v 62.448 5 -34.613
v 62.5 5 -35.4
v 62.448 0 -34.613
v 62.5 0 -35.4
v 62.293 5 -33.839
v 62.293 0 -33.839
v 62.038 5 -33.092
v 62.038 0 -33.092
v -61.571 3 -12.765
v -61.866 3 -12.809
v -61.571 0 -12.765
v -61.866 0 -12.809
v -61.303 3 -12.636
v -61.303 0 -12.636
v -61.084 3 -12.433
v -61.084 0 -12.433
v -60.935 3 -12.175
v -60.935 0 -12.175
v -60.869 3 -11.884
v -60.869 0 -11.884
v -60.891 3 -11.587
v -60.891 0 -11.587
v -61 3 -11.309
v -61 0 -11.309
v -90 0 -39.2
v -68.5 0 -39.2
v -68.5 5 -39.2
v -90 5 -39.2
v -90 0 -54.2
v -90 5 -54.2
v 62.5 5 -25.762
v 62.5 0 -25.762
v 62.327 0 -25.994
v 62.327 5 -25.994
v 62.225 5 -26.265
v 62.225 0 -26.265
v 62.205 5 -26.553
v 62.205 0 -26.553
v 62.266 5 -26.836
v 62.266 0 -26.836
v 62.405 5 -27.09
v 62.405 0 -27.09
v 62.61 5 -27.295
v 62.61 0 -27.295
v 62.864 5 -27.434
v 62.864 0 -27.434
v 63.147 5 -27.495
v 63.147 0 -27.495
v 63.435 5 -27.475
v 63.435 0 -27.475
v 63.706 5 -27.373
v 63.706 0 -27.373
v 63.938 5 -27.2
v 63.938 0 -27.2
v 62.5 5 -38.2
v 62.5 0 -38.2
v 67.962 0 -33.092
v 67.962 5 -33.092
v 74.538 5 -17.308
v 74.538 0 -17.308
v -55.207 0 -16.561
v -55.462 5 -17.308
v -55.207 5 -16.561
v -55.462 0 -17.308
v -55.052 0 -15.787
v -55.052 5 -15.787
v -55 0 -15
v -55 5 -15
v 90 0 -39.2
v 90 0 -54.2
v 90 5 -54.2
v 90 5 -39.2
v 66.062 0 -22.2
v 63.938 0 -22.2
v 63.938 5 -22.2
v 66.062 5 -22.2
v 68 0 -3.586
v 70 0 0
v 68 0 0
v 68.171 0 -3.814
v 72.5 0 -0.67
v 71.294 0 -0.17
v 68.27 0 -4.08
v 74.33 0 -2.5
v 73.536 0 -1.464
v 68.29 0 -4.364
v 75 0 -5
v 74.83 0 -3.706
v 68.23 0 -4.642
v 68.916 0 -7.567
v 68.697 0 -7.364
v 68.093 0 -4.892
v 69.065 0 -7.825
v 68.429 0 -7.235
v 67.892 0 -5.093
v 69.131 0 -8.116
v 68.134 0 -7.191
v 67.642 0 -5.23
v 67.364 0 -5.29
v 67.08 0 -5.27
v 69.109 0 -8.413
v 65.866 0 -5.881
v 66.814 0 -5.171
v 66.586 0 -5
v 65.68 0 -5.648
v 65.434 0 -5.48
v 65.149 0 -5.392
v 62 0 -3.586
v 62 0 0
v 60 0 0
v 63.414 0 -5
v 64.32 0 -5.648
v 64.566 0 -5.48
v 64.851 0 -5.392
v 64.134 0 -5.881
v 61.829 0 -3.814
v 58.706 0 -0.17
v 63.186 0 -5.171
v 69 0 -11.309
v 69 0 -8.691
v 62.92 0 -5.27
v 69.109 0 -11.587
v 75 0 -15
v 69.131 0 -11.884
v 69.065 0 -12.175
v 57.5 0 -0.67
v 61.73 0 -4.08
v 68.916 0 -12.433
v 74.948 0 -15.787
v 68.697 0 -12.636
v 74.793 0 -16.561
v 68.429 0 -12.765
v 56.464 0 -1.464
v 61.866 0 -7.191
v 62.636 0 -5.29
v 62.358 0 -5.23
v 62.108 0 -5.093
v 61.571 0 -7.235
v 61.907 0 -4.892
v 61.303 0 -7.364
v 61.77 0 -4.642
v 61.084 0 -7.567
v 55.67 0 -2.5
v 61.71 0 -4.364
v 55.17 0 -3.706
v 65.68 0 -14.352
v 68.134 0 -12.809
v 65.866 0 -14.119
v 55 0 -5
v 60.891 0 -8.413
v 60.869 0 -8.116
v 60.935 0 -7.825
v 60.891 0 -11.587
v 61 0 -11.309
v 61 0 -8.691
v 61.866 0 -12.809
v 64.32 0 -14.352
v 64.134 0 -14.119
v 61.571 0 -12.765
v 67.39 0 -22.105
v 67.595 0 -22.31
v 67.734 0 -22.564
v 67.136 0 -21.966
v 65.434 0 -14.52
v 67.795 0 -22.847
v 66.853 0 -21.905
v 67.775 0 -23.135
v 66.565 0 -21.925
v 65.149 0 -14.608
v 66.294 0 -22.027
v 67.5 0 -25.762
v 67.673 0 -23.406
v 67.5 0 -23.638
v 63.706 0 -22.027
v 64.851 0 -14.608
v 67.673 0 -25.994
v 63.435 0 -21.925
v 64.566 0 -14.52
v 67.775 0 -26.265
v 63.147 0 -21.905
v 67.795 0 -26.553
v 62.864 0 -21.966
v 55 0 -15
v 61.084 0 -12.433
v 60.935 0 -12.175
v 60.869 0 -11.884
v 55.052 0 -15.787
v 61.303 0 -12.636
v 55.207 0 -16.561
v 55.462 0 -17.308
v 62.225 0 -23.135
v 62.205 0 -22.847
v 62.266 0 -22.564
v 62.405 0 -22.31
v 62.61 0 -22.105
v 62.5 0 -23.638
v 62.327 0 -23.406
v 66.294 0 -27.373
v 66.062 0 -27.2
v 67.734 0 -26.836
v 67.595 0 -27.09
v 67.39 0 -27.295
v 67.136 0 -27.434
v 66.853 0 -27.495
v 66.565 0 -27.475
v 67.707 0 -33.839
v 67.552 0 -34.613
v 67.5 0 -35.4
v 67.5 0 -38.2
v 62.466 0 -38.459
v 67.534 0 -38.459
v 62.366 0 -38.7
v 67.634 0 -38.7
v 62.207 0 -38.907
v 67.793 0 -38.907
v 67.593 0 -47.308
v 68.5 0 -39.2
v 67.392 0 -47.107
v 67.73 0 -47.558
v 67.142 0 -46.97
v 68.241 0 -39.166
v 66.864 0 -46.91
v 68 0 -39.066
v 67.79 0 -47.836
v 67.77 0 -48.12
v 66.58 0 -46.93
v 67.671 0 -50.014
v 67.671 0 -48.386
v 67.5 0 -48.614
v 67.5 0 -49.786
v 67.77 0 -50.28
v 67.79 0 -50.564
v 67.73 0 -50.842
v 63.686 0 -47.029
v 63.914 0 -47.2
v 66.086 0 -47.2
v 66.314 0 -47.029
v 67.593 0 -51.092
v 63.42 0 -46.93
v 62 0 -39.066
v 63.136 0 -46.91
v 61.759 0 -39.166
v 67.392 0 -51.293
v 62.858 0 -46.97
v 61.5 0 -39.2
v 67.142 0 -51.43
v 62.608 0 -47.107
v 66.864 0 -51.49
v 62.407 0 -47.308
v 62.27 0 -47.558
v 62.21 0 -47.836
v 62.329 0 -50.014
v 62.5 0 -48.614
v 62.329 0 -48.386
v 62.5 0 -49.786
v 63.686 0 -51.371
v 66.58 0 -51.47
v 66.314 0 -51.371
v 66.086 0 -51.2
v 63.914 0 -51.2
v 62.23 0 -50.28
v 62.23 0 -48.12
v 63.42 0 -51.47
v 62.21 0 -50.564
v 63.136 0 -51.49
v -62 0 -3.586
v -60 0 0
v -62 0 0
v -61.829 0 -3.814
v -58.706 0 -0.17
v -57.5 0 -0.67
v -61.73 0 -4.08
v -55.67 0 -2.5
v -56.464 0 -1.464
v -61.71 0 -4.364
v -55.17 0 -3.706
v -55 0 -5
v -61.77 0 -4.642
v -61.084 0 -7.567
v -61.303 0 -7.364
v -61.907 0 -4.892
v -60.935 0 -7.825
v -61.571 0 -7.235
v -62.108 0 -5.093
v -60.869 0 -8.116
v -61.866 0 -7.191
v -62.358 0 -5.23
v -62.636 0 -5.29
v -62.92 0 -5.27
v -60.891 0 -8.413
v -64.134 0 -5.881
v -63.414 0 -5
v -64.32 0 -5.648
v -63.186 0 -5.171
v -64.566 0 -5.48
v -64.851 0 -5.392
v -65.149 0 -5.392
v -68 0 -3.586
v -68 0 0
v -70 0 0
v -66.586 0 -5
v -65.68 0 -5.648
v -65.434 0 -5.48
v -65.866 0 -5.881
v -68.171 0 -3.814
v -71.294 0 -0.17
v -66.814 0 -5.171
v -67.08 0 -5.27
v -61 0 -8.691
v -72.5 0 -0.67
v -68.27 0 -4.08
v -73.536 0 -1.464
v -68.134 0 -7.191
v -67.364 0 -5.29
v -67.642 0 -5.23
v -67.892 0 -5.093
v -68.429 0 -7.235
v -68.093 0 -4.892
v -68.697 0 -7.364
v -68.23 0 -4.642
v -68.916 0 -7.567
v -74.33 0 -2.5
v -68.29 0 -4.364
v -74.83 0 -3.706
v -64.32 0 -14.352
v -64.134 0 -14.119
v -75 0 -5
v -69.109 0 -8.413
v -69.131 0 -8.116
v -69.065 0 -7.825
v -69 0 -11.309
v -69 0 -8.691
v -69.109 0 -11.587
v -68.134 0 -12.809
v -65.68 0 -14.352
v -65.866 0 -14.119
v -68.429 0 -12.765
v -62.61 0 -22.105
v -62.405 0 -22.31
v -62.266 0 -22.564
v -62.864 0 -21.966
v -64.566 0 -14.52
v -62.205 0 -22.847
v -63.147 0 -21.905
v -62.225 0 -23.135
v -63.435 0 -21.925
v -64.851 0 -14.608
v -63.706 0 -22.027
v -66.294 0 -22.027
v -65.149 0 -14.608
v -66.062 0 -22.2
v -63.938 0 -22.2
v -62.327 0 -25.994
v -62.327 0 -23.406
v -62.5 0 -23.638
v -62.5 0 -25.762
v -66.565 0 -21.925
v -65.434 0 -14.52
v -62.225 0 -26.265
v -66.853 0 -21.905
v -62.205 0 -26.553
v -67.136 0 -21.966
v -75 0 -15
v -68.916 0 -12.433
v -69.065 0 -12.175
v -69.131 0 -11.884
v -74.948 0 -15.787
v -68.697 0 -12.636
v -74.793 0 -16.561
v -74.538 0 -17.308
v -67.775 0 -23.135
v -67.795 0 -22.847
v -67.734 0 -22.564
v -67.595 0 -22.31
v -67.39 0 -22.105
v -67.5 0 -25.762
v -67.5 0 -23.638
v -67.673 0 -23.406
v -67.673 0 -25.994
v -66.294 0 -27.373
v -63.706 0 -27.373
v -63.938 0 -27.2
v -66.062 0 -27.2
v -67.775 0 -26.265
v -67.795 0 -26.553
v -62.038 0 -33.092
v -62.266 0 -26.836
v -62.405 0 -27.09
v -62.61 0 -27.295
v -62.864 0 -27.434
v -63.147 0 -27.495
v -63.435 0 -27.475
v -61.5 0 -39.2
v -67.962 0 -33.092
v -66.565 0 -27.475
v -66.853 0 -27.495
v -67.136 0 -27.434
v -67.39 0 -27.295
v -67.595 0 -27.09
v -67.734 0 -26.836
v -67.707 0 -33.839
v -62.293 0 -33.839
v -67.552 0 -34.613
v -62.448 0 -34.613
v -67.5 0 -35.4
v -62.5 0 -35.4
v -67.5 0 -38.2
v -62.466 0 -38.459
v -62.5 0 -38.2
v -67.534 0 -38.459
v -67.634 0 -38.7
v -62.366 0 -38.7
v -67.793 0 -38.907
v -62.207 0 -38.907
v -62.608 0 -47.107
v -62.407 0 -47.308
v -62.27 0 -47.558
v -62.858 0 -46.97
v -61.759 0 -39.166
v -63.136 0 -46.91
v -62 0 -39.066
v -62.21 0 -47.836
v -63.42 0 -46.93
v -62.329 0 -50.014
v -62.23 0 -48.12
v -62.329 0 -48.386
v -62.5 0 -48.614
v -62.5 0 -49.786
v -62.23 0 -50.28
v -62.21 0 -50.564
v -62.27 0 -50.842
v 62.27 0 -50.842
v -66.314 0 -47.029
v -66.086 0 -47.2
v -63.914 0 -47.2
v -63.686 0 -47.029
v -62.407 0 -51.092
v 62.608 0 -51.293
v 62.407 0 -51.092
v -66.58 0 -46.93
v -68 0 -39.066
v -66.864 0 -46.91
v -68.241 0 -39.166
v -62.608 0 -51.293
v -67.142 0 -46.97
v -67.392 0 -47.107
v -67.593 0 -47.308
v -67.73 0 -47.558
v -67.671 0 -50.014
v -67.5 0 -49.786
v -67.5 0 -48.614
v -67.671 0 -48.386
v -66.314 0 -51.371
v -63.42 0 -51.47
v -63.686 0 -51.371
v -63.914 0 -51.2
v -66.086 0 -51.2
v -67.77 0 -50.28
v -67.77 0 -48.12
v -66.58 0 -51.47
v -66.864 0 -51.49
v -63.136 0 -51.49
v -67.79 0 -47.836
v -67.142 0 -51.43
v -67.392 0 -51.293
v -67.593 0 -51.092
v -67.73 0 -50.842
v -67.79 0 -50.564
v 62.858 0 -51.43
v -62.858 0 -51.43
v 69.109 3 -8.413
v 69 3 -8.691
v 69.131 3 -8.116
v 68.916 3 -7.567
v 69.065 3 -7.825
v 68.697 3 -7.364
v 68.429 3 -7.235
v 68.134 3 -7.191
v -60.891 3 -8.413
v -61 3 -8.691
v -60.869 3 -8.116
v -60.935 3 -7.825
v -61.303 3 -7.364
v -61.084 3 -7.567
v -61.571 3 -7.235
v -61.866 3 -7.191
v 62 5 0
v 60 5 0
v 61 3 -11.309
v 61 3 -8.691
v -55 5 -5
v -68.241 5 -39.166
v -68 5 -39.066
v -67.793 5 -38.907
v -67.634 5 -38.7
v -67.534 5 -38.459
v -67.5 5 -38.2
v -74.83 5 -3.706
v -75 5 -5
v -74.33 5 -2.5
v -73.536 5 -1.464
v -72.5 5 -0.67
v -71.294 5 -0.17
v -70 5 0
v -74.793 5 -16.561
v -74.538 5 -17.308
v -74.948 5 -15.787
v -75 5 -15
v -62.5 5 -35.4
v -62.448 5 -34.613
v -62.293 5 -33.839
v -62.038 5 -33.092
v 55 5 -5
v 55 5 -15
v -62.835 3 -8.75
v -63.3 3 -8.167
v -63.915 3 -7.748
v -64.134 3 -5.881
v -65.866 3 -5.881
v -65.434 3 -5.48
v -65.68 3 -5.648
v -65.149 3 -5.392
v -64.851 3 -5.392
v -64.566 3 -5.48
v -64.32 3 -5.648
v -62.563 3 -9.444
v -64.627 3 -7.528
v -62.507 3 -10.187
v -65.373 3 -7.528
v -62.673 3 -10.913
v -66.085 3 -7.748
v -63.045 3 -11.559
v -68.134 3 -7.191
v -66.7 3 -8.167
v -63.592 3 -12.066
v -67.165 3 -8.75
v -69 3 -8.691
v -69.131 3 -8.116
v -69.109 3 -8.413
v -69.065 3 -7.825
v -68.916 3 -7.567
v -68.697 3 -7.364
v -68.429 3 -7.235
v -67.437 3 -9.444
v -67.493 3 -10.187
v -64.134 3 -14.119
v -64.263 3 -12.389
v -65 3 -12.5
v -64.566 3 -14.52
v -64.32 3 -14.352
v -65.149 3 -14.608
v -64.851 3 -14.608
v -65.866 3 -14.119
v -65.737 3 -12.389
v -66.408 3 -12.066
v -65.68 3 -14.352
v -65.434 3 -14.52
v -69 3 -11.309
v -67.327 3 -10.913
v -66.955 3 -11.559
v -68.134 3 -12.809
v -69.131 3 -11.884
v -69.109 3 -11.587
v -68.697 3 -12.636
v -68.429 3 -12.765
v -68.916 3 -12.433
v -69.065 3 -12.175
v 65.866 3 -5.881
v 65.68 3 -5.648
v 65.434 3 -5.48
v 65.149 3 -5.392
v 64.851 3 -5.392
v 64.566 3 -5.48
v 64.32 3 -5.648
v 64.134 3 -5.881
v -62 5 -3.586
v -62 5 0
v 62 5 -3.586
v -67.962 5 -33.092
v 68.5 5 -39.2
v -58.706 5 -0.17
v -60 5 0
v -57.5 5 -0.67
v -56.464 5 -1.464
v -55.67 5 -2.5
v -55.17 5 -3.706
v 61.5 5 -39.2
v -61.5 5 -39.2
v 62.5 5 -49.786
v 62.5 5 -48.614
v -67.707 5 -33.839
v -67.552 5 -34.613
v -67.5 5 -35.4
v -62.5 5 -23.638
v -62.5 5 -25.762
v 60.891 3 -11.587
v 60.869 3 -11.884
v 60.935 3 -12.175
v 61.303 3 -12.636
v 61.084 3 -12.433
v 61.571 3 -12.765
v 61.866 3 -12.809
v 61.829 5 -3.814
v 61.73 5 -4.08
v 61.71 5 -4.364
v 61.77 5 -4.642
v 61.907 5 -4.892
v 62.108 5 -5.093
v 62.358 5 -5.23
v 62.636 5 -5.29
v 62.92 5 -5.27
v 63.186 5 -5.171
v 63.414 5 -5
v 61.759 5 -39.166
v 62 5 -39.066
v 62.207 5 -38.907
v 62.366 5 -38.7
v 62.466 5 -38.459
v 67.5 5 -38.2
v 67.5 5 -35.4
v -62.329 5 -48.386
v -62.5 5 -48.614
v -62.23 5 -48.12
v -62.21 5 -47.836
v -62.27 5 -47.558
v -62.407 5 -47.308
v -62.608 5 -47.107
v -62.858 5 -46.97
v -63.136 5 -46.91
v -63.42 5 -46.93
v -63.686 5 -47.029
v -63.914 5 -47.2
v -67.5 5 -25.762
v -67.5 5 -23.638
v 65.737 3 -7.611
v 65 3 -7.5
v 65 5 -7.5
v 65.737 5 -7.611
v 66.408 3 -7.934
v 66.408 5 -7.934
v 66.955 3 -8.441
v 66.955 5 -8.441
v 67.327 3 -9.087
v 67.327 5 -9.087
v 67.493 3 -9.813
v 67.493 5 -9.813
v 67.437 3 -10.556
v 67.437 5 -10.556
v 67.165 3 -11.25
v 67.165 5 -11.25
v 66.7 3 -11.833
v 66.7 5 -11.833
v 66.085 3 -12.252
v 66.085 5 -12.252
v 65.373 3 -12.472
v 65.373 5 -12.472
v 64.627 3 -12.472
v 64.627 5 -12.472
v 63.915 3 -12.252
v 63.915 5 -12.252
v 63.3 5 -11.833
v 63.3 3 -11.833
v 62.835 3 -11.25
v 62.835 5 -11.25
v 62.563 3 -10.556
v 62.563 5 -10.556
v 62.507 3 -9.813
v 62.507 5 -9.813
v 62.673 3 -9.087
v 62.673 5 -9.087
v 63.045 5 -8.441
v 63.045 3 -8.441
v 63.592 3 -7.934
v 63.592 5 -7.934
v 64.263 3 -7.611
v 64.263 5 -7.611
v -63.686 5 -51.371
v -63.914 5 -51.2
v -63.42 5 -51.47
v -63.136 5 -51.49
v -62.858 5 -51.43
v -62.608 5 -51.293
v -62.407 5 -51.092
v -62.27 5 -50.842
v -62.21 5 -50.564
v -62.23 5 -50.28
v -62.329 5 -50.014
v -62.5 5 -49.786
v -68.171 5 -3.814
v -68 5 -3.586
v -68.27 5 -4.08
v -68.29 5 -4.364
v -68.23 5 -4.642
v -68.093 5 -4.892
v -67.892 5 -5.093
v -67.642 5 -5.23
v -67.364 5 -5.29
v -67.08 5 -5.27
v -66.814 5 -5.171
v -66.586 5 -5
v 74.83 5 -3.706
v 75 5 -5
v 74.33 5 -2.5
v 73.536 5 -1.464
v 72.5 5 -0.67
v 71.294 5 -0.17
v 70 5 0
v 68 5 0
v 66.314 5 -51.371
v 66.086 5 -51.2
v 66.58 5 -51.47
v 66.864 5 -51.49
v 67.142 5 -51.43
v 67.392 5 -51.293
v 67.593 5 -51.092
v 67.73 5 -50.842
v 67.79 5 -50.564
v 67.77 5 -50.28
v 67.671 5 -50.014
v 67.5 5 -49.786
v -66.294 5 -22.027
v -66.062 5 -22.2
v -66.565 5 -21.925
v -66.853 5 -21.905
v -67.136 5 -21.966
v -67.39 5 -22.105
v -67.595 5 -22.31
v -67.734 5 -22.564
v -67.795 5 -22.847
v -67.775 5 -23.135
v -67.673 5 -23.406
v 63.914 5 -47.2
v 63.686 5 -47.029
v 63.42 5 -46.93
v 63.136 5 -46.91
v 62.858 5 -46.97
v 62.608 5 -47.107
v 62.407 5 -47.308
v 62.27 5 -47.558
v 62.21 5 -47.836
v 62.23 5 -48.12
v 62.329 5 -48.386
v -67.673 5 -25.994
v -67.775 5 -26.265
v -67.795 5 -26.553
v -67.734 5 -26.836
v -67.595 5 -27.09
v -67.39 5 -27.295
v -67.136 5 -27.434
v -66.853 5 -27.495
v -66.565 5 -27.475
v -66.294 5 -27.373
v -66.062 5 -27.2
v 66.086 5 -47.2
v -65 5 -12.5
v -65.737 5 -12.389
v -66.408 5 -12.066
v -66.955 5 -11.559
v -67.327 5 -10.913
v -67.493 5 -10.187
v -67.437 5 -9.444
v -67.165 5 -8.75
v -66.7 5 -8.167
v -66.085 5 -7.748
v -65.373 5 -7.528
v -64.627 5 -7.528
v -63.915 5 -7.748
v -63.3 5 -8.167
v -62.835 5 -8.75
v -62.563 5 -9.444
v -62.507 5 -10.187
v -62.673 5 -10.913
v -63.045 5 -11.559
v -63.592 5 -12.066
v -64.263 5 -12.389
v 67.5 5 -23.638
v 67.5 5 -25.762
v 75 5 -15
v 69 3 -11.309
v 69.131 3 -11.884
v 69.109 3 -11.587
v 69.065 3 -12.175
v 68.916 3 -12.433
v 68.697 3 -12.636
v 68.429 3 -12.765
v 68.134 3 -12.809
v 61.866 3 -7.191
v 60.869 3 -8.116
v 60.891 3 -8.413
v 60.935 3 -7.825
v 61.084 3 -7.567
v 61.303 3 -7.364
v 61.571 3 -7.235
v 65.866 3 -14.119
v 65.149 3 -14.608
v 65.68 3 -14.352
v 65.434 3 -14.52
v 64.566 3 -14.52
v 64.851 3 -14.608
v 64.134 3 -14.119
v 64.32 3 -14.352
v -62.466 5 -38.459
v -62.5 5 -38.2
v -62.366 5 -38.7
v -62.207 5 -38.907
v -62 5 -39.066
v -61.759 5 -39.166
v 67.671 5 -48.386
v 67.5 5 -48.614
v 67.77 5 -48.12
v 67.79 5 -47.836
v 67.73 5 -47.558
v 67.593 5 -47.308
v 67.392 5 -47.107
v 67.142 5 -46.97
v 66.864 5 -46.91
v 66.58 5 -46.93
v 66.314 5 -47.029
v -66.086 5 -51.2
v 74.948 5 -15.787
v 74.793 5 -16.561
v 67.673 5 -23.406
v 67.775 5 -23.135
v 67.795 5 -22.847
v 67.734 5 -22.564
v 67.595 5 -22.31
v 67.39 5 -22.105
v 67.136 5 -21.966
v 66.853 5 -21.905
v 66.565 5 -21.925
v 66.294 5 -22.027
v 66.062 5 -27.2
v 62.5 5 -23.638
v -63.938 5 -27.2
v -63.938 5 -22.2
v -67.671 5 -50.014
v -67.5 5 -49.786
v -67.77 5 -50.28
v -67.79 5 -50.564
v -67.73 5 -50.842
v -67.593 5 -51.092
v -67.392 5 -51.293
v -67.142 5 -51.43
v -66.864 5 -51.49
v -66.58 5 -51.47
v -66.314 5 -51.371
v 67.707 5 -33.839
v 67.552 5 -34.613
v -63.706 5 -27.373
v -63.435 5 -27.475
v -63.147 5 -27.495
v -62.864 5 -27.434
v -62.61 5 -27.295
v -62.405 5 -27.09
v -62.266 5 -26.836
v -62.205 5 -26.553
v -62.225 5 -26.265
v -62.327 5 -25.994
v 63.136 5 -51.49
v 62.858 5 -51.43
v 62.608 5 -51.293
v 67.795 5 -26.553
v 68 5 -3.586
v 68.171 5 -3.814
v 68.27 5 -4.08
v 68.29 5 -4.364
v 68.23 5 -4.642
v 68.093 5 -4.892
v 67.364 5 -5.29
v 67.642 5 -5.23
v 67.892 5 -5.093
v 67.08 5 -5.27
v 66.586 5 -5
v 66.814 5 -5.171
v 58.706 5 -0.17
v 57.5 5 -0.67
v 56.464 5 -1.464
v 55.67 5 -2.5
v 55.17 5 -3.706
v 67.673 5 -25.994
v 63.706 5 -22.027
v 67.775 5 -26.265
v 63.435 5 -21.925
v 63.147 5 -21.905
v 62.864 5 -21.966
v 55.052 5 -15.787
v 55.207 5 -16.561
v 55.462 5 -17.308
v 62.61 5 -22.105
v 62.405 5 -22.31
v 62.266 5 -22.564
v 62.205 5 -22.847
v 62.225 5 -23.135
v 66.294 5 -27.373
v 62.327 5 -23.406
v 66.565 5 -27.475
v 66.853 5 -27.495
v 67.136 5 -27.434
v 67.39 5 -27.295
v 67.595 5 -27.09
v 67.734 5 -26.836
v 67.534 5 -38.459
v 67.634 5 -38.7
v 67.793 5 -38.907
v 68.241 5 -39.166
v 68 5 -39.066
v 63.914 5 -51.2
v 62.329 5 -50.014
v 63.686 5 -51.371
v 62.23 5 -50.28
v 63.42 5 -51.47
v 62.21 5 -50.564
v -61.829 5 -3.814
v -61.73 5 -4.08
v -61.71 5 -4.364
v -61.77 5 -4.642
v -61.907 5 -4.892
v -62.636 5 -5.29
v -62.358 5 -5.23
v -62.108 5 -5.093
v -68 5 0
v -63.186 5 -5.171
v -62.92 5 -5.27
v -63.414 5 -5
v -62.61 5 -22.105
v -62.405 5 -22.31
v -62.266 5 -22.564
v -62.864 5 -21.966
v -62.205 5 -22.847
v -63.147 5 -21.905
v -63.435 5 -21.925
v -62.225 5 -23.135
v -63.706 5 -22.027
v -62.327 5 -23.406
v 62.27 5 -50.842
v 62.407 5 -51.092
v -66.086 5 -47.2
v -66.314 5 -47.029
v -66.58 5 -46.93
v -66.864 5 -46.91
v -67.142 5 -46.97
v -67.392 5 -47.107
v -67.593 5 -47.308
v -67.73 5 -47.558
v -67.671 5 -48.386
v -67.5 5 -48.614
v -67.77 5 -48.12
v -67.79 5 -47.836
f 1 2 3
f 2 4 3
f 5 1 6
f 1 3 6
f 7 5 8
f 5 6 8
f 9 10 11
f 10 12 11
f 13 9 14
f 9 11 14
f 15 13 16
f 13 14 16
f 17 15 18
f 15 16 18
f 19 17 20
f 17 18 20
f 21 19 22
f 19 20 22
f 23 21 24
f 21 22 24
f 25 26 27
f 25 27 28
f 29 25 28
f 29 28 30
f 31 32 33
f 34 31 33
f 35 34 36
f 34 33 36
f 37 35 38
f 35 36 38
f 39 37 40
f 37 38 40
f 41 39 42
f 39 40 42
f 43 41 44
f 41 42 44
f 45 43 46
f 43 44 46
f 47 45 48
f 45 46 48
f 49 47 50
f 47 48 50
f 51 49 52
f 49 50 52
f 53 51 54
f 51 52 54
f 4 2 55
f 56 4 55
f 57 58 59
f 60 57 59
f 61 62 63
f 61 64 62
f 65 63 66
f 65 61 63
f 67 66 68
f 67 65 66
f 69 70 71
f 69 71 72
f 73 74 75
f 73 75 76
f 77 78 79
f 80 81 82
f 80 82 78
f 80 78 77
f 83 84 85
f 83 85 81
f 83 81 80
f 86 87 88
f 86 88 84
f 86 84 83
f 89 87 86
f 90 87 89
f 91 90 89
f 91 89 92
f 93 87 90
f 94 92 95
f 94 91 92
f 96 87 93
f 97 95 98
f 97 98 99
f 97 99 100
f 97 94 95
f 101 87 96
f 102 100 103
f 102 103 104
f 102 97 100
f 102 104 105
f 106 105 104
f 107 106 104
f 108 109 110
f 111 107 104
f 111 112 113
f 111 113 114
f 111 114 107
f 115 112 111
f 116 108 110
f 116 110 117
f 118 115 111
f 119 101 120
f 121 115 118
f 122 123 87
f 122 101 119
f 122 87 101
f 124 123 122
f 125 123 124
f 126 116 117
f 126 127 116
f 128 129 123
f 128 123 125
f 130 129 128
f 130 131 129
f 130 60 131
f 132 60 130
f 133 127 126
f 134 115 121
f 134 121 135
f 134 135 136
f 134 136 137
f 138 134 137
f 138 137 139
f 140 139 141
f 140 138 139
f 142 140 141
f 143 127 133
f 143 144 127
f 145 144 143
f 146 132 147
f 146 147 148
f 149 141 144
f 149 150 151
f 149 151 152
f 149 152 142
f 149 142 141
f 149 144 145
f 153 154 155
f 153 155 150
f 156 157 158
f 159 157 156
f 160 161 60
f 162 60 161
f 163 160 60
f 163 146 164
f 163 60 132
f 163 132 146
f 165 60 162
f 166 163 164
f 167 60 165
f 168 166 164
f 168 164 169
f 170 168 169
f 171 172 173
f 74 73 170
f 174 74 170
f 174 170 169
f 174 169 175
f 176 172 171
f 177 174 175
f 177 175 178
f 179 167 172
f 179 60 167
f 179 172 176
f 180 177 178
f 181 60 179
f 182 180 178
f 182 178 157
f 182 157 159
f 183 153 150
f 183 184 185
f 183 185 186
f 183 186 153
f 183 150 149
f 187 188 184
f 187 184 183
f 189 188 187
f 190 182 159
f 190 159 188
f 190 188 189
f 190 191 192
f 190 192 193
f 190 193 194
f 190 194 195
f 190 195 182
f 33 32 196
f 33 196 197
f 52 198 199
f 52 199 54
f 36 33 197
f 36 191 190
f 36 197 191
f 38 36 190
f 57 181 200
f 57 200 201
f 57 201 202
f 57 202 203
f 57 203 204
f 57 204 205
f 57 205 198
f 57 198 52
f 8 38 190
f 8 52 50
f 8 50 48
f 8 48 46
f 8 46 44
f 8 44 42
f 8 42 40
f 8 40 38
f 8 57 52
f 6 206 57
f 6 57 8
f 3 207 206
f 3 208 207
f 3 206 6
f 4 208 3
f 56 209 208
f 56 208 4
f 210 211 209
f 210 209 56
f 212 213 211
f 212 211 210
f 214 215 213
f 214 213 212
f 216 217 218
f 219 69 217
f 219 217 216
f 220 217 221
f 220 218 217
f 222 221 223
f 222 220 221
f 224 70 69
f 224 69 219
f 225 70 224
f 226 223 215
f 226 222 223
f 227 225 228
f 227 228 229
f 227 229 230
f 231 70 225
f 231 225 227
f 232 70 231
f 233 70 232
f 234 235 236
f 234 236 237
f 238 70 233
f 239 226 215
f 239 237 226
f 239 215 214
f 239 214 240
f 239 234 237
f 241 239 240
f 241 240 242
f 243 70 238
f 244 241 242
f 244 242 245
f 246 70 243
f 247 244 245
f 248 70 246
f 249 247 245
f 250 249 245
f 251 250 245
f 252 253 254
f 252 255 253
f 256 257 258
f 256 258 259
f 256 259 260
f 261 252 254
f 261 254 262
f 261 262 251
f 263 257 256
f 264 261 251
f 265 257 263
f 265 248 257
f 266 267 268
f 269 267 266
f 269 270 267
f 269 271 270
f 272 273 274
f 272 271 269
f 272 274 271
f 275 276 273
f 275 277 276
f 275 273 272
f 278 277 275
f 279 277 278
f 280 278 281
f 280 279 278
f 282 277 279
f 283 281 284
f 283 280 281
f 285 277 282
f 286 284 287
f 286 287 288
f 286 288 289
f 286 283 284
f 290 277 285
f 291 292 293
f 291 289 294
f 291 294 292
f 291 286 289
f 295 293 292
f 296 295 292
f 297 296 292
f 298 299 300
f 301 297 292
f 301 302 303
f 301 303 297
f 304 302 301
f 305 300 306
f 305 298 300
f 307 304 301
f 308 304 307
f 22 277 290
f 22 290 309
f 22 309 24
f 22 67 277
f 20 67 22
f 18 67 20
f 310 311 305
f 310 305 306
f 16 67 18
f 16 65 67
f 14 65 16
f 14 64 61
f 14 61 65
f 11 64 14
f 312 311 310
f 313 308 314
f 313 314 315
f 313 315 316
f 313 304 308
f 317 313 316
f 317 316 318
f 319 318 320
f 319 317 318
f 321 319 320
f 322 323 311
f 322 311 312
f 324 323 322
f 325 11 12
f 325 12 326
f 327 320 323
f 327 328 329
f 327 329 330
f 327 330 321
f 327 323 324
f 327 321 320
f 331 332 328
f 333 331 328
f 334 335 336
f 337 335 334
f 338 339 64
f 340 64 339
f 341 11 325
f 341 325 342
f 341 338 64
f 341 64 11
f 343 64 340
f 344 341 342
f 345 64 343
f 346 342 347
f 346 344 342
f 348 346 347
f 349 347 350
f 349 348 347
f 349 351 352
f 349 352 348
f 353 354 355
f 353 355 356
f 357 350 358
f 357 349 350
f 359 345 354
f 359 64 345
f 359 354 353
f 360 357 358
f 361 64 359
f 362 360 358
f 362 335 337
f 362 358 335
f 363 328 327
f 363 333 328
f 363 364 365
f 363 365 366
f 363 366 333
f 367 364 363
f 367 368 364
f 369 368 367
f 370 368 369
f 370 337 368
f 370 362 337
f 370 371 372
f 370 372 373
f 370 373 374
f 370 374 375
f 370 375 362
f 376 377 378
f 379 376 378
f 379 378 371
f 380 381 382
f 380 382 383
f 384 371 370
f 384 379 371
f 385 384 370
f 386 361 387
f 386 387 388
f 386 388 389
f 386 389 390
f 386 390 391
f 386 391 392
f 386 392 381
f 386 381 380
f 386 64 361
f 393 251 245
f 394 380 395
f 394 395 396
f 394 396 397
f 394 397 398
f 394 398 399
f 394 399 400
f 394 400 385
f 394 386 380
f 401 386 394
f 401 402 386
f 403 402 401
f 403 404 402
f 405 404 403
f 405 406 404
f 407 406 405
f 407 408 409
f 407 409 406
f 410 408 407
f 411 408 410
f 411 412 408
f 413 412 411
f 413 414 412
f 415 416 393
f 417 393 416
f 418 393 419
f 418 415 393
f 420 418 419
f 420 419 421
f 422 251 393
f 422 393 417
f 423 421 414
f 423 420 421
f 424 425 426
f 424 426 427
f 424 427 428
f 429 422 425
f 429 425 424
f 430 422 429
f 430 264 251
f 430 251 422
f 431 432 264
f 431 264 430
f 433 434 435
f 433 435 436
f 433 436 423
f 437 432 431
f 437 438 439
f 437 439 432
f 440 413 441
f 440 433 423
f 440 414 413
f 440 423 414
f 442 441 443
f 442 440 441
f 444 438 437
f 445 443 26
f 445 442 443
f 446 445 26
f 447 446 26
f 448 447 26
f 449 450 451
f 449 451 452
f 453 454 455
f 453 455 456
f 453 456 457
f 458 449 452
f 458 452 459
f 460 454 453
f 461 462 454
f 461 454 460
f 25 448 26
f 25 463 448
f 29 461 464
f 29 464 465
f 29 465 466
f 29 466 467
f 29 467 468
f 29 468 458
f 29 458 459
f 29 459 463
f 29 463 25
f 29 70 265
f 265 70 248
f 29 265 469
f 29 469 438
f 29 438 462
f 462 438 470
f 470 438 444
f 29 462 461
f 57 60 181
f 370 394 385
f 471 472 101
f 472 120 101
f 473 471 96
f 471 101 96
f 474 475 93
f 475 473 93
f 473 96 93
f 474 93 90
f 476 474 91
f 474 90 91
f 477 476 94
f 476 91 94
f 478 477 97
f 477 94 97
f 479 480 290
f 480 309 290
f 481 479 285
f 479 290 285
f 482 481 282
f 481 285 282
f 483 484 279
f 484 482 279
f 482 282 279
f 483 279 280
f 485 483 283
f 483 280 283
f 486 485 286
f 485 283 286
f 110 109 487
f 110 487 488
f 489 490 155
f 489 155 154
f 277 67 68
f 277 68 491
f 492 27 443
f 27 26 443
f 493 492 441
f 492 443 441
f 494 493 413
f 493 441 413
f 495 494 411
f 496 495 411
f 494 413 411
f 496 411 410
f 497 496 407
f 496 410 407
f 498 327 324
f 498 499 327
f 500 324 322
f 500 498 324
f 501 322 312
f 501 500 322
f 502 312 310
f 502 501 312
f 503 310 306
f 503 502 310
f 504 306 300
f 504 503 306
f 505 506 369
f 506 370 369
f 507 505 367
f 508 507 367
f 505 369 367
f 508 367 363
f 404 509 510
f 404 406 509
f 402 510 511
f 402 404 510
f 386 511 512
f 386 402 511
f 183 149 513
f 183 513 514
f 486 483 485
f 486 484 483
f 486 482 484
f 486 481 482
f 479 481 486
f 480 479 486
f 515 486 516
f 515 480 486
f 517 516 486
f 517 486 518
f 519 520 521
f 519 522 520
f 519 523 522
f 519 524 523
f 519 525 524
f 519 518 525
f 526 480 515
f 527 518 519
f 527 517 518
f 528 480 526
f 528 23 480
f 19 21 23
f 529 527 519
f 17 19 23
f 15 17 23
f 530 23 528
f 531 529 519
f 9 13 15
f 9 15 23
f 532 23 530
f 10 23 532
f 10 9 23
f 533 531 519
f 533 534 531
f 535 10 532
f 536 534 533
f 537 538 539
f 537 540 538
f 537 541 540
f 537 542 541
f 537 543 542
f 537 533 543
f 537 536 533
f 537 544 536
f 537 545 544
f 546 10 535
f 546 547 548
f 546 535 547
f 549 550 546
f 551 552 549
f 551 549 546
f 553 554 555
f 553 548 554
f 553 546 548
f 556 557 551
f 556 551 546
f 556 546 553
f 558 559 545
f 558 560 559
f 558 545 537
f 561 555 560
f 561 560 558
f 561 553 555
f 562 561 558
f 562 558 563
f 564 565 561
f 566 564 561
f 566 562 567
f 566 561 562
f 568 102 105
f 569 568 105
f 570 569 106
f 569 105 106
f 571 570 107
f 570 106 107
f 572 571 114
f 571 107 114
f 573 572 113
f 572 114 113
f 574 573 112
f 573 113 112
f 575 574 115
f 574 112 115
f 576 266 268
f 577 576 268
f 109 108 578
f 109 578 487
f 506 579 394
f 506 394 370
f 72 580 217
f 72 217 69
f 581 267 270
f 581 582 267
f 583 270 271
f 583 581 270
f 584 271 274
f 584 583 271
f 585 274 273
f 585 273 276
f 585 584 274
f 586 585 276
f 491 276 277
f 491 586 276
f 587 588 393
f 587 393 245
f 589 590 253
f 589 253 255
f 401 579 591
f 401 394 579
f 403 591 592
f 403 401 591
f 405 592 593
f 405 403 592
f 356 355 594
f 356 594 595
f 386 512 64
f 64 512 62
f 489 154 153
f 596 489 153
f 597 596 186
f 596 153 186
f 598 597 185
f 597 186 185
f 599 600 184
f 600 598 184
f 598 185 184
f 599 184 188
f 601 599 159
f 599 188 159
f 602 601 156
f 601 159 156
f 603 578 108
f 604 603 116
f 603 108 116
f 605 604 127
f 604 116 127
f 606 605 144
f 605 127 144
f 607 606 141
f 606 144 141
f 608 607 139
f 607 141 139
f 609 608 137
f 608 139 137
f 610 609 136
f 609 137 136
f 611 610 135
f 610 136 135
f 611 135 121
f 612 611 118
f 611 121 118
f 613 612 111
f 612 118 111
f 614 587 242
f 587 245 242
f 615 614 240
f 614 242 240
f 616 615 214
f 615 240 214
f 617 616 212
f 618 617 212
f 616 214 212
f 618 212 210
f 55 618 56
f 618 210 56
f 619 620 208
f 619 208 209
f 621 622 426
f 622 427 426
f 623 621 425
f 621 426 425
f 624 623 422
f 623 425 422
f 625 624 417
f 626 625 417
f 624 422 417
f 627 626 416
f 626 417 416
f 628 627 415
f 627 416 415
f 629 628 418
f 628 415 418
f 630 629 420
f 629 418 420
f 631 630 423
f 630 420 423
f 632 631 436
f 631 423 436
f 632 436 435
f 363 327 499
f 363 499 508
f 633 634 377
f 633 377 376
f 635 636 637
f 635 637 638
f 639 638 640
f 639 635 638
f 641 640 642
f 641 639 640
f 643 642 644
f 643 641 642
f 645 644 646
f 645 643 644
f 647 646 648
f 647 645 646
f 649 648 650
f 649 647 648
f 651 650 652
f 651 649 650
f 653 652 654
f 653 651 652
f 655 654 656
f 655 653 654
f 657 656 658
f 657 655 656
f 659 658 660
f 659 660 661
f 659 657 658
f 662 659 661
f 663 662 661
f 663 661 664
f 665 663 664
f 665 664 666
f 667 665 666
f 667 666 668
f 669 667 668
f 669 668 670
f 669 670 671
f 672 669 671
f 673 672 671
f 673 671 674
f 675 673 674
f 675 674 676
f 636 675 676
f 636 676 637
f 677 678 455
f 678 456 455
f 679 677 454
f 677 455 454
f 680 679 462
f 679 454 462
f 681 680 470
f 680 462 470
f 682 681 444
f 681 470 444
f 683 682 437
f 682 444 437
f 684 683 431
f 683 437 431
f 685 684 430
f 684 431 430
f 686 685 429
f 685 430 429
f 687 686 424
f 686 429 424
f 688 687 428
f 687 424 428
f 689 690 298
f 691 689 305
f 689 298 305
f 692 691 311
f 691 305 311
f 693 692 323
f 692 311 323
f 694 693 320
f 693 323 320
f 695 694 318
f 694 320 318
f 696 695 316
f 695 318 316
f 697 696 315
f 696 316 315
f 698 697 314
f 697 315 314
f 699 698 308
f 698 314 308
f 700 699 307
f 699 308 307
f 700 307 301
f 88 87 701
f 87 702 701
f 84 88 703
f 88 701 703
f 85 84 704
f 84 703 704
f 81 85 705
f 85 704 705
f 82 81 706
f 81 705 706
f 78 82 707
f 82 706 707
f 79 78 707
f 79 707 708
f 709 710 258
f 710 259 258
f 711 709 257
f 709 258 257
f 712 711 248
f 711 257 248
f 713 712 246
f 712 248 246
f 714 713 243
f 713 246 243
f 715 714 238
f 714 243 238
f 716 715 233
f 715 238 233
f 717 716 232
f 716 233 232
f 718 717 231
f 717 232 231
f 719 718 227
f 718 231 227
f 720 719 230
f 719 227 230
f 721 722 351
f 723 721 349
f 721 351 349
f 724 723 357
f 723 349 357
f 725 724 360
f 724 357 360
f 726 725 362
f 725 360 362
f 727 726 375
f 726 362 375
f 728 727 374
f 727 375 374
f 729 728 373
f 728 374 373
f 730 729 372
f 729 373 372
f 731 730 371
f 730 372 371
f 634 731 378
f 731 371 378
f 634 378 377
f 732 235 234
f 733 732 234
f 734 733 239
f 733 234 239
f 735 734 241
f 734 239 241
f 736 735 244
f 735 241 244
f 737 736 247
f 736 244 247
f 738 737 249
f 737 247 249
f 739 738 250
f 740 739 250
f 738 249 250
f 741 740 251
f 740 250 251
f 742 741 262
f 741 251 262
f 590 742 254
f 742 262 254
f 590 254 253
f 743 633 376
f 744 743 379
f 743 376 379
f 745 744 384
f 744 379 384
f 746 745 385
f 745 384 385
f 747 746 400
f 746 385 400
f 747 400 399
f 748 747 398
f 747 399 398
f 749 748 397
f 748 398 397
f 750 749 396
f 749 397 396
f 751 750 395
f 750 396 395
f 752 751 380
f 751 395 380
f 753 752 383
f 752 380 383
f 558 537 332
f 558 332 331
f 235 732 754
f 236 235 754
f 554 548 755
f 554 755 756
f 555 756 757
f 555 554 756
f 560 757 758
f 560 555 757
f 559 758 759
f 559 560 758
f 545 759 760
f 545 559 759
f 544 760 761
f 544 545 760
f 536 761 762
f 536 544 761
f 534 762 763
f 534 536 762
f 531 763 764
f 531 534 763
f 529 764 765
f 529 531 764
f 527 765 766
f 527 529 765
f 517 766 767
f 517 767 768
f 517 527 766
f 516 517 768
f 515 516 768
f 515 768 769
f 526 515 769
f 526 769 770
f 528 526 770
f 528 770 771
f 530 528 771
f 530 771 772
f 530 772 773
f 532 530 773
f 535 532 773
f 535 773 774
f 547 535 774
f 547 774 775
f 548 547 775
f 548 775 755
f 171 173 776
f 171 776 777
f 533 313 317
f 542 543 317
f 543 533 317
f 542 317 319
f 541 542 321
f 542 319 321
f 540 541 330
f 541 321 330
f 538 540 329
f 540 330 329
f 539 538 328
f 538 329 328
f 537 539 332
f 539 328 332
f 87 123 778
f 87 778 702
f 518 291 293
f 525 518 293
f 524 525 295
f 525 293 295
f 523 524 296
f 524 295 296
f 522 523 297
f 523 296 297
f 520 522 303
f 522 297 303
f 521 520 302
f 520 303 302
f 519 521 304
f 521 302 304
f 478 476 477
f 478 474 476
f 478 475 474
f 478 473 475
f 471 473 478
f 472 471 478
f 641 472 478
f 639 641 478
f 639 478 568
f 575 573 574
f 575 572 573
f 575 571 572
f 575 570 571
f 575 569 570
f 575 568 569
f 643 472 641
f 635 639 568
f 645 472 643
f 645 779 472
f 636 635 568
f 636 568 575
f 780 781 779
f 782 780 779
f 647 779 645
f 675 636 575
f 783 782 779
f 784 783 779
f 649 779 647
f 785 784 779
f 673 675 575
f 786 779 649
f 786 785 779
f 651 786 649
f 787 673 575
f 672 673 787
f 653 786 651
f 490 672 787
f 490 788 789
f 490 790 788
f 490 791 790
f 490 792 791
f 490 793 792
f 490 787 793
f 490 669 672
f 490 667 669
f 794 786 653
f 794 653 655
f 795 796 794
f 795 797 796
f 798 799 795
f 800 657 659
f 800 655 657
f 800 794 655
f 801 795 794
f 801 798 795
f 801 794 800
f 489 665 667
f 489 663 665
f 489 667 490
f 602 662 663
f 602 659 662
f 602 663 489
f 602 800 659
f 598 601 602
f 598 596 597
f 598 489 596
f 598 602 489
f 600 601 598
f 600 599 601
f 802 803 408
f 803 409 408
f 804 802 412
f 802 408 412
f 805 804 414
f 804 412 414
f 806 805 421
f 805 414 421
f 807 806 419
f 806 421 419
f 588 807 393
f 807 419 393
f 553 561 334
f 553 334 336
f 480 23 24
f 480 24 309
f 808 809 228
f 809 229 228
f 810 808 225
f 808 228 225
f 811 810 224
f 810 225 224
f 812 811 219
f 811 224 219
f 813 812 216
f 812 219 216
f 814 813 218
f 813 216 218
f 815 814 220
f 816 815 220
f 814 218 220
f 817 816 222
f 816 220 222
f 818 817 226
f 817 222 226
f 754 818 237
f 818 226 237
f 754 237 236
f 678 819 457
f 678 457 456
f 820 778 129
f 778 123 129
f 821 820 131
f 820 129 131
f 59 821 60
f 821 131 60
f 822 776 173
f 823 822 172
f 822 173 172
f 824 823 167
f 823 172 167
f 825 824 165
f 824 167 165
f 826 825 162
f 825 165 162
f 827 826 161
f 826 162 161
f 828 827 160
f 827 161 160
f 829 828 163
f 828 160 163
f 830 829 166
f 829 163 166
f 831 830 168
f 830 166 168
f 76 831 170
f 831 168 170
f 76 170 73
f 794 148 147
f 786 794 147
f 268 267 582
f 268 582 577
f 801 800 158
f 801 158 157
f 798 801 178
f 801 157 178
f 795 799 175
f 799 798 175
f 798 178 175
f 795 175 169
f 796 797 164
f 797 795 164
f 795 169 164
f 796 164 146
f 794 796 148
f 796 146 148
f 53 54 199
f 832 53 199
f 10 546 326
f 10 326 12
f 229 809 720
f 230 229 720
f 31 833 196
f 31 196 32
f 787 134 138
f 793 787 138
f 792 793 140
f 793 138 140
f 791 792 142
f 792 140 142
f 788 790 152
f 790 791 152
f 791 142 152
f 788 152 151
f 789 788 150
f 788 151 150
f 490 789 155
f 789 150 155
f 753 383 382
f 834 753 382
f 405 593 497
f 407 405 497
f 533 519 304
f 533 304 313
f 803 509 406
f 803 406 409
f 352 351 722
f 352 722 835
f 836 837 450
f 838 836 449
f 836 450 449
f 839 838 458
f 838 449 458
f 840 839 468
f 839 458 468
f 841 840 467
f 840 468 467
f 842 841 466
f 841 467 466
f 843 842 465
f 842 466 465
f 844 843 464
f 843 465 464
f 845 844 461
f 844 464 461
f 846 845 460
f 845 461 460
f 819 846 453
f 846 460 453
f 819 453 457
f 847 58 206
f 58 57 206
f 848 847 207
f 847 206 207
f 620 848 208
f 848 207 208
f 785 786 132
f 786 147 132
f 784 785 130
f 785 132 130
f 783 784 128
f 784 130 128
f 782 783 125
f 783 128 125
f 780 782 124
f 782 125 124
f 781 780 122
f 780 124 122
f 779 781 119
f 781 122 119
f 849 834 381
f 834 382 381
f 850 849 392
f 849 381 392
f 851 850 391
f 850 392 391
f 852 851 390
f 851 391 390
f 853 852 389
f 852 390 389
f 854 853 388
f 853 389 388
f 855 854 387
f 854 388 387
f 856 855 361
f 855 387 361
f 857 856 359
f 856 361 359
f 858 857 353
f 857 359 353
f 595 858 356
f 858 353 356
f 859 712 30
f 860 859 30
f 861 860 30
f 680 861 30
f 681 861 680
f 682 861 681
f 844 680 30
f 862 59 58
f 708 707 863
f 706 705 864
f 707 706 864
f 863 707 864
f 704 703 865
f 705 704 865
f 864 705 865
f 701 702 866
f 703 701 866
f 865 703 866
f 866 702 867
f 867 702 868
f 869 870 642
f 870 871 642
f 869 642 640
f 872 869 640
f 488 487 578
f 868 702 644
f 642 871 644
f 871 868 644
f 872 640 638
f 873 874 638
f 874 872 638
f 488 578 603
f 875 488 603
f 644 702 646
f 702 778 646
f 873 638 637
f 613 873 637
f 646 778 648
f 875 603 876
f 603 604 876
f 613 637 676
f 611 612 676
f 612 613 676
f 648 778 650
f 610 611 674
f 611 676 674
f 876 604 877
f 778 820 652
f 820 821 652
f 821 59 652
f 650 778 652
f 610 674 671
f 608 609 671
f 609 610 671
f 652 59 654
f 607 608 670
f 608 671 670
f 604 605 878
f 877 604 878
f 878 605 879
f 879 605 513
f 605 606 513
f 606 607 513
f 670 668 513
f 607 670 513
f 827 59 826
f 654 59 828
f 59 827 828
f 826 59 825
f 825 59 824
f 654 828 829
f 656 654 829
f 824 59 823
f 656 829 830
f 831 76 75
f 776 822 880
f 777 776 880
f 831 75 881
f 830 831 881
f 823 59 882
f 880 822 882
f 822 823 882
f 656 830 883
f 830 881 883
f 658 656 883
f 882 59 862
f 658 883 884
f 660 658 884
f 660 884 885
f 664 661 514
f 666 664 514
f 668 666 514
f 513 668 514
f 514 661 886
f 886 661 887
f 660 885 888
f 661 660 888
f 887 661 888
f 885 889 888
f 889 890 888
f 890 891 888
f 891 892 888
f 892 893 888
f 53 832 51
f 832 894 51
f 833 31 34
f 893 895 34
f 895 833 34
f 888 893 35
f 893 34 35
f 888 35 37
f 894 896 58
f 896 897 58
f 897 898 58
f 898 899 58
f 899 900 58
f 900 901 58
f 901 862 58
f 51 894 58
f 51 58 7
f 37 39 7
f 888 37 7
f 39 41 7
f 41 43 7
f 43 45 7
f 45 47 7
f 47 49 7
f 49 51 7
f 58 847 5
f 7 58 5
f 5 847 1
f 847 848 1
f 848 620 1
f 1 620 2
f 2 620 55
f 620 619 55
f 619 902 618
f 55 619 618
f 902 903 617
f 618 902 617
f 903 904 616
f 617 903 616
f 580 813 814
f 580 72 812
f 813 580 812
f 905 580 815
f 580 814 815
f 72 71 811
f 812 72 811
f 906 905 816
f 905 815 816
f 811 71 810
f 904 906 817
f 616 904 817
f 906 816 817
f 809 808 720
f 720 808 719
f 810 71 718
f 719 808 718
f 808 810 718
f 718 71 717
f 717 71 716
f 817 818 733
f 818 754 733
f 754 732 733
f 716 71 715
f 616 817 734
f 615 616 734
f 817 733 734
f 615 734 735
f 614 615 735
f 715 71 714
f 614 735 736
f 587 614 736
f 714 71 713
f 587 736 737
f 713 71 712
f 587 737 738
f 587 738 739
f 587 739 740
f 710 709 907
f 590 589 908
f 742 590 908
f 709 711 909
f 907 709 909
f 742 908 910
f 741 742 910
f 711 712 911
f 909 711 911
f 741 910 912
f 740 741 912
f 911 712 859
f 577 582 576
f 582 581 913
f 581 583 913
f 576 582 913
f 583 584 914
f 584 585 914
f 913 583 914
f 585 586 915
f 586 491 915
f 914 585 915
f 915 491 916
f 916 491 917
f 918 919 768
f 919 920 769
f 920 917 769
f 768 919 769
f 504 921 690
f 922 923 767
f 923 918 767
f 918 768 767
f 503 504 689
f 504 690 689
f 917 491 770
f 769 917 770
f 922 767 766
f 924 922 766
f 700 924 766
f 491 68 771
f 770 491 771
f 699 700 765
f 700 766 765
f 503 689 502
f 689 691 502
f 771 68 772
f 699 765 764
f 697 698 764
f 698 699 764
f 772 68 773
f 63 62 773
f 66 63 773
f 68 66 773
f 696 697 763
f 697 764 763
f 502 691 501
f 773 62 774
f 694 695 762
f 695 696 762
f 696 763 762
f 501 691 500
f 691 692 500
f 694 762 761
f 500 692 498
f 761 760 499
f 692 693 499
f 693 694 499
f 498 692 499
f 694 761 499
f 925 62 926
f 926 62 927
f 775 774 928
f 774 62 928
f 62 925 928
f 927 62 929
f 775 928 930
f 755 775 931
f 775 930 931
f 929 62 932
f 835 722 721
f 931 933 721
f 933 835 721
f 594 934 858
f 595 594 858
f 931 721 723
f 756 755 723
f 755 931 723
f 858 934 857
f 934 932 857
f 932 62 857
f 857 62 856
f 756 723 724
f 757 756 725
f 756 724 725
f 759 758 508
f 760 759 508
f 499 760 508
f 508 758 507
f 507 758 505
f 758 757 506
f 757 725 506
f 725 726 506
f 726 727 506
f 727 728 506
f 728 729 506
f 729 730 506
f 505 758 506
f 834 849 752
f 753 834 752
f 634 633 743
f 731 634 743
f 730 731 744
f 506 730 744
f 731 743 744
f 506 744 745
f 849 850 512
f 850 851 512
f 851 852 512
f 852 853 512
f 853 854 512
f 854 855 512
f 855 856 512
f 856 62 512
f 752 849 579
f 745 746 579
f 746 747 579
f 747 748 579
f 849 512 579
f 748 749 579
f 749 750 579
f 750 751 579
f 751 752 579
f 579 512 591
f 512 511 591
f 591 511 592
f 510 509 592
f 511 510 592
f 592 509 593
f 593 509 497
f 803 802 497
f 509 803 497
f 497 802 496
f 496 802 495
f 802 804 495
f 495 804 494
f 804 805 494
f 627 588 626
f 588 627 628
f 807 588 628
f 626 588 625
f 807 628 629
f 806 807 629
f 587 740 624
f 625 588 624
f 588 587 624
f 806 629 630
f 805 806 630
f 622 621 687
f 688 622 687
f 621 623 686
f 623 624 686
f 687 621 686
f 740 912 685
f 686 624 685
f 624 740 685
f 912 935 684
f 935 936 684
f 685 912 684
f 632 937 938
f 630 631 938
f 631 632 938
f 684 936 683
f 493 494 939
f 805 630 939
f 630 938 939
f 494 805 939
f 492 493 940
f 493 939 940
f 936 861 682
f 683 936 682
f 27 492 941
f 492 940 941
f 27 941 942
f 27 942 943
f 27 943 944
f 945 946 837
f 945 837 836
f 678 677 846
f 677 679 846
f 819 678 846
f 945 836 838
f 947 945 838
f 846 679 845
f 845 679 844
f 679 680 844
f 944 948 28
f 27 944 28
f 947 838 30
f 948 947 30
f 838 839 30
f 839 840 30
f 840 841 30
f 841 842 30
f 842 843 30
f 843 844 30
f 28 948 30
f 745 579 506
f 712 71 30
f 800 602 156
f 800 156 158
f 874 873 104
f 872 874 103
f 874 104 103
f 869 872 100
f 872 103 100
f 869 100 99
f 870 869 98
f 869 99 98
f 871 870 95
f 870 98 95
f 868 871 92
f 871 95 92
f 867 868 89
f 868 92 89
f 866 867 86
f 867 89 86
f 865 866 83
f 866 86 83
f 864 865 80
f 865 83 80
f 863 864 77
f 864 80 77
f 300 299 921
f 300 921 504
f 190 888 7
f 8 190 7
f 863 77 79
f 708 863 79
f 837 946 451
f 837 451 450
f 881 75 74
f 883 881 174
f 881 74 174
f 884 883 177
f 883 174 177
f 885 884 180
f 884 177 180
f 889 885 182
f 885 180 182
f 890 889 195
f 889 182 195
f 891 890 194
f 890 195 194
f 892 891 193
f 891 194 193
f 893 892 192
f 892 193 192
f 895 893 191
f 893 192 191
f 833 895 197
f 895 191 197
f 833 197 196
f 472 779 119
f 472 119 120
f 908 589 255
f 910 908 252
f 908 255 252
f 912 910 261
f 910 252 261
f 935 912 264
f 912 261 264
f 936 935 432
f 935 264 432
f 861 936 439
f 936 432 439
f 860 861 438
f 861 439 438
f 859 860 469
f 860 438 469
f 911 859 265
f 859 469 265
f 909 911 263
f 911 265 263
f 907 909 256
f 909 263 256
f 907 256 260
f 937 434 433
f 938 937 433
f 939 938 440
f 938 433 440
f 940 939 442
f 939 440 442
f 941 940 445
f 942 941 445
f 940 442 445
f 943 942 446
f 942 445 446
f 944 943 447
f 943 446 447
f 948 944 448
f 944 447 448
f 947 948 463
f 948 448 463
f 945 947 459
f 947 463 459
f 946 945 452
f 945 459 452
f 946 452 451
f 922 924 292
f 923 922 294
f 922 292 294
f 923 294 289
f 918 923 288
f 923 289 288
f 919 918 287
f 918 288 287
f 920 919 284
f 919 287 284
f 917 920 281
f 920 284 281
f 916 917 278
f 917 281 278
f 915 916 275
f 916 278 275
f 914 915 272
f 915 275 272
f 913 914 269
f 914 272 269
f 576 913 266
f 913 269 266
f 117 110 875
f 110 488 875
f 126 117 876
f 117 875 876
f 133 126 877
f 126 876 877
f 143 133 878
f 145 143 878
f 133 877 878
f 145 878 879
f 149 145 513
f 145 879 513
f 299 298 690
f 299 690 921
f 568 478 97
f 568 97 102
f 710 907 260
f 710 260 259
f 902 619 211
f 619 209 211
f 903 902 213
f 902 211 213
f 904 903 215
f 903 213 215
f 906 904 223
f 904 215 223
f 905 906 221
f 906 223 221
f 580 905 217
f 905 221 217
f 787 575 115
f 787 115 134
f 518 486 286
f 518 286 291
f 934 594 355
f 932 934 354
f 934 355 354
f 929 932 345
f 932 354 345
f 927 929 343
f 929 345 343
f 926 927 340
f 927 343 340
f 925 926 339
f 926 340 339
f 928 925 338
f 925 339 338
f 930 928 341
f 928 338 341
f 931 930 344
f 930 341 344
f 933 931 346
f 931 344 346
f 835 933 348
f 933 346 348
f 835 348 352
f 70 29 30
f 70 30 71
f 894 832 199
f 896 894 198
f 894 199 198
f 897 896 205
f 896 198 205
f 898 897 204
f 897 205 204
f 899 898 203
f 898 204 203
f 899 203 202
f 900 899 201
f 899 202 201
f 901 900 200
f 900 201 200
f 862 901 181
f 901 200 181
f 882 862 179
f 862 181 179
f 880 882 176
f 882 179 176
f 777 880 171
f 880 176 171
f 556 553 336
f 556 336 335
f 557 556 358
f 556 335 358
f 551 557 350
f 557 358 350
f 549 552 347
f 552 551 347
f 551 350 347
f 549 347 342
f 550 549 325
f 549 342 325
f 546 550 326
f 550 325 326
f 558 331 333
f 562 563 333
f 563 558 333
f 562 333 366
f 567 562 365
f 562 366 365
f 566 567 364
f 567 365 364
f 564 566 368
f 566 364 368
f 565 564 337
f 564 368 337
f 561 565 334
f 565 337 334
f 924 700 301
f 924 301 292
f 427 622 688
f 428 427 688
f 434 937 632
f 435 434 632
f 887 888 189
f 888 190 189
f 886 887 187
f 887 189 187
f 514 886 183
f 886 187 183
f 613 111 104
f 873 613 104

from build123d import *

# Parameters (mm, degrees)
SKETCH_1_R           = 2.5
EXTRUDE_1_DEPTH      = 5
FILLET_1_R           = 5
SKETCH_6_W           = 6
SKETCH_6_H           = 5
CUT_EXTRUDE_5_DEPTH  = 10
SKETCH_7_R           = 1
CUT_EXTRUDE_6_DEPTH  = 10
SKETCH_8_W           = 7.5
SKETCH_8_H           = 5
CUT_EXTRUDE_7_DEPTH  = 10
FILLET_2_R           = 1
CUT_EXTRUDE_9_DEPTH  = 10
FILLET_3_R           = 6
SKETCH_12_W          = 5
SKETCH_12_H          = 4
SKETCH_12_H_2        = 5
CUT_EXTRUDE_10_DEPTH = 5
CUT_EXTRUDE_12_DEPTH = 3
SKETCH_15_R          = 1
CUT_EXTRUDE_13_DEPTH = 3
SKETCH_16_R          = 1
SKETCH_16_R_2        = 1.016973241
CUT_EXTRUDE_14_DEPTH = 10


with BuildPart() as part:
    # 스케치1 → 보스-돌출1 (new body)
    with BuildSketch(Plane(origin=(0, 0, 0), x_dir=(1, 0, 0), z_dir=(0, 1, 0))):
        Polygon((-90, 54.2), (90, 54.2), (90, 39.2), (75, 39.2), (75, 0), (55, 0), (55, 39.2), (-55, 39.2), (-55, 0), (-75, 0), (-75, 39.2), (-90, 39.2), align=None)
        with Locations(Location((65, 10, 0), (0, 0, 270))):
            Circle(SKETCH_1_R, mode=Mode.SUBTRACT)
        with Locations(Location((-65, 10, 0), (0, 0, 90))):
            Circle(SKETCH_1_R, mode=Mode.SUBTRACT)
    extrude(amount=EXTRUDE_1_DEPTH)

    # 필렛1
    fillet_1_edges = [part.edges().sort_by_distance(p)[0] for p in [
        (75, 2.5, 0),
        (55, 2.5, 0),
        (-55, 2.5, 0),
        (-75, 2.5, 0),
    ]]
    fillet(fillet_1_edges, radius=FILLET_1_R)

    # 스케치6 → 컷-돌출5 (cut)
    with BuildSketch(Plane.XZ):
        with Locations((65, -2.5)):
            Rectangle(SKETCH_6_W, SKETCH_6_H)
        with Locations((-65, -2.5)):
            Rectangle(SKETCH_6_W, SKETCH_6_H)
    extrude(amount=-CUT_EXTRUDE_5_DEPTH, mode=Mode.SUBTRACT)

    # 스케치7 → 컷-돌출6 (cut)
    with BuildSketch(Plane.XZ):
        with Locations((62.707106781, -4.292893219)):
            Circle(SKETCH_7_R)
        with Locations((67.292893219, -4.292893219)):
            Circle(SKETCH_7_R)
        with Locations((-67.292893219, -4.292893219)):
            Circle(SKETCH_7_R)
        with Locations((-62.707106781, -4.292893219)):
            Circle(SKETCH_7_R)
    extrude(amount=-CUT_EXTRUDE_6_DEPTH, mode=Mode.SUBTRACT)

    # 스케치8 → 컷-돌출7 (cut)
    with BuildSketch(Plane(origin=(0, 5, 0), x_dir=(1, 0, 0), z_dir=(0, 1, 0))):
        with Locations((71.25, 36.7)):
            Rectangle(SKETCH_8_W, SKETCH_8_H)
        with Locations((58.75, 36.7)):
            Rectangle(SKETCH_8_W, SKETCH_8_H)
        with Locations((-58.75, 36.7)):
            Rectangle(SKETCH_8_W, SKETCH_8_H)
        with Locations((-71.25, 36.7)):
            Rectangle(SKETCH_8_W, SKETCH_8_H)
    extrude(amount=-CUT_EXTRUDE_7_DEPTH, mode=Mode.SUBTRACT)

    # 필렛2
    fillet_2_edges = [part.edges().sort_by_distance(p)[0] for p in [
        (67.5, 2.5, -39.2),
        (62.5, 2.5, -39.2),
        (-62.5, 2.5, -39.2),
        (-67.5, 2.5, -39.2),
    ]]
    fillet(fillet_2_edges, radius=FILLET_2_R)

    # 스케치10 → 컷-돌출9 (cut)
    with BuildSketch(Plane(origin=(0, 5, 0), x_dir=(1, 0, 0), z_dir=(0, 1, 0))):
        Polygon((75, 34.2), (67.5, 34.2), (75, 16.2), align=None)
        Polygon((62.5, 34.2), (55, 34.2), (55, 16.2), align=None)
        Polygon((-75, 16.2), (-75, 34.2), (-67.5, 34.2), align=None)
        Polygon((-55, 16.2), (-55, 34.2), (-62.5, 34.2), align=None)
    extrude(amount=-CUT_EXTRUDE_9_DEPTH, mode=Mode.SUBTRACT)

    # 필렛3
    fillet_3_edges = [part.edges().sort_by_distance(p)[0] for p in [
        (67.5, 2.5, -34.2),
        (62.5, 2.5, -34.2),
        (-62.5, 2.5, -34.2),
        (-67.5, 2.5, -34.2),
        (75, 2.5, -16.2),
        (55, 2.5, -16.2),
        (-75, 2.5, -16.2),
        (-55, 2.5, -16.2),
    ]]
    fillet(fillet_3_edges, radius=FILLET_3_R)

    # 스케치12 → 컷-돌출10 (cut)
    with BuildSketch(Plane(origin=(0, 5, 0), x_dir=(1, 0, 0), z_dir=(0, 1, 0))):
        with Locations((65, 49.2)):
            Rectangle(SKETCH_12_W, SKETCH_12_H)
        with Locations((65, 24.7)):
            Rectangle(SKETCH_12_W, SKETCH_12_H_2)
        with Locations((-65, 24.7)):
            Rectangle(SKETCH_12_W, SKETCH_12_H_2)
        with Locations((-65, 49.2)):
            Rectangle(SKETCH_12_W, SKETCH_12_H)
    extrude(amount=-CUT_EXTRUDE_10_DEPTH, mode=Mode.SUBTRACT)

    # 스케치14 → 컷-돌출12 (cut)
    with BuildSketch(Plane(origin=(0, 0, 0), x_dir=(-1, 0, 0), z_dir=(0, -1, 0))):
        Polygon((-65, 14.618802154), (-69, 12.309401077), (-69, 7.690598923), (-65, 5.381197846), (-61, 7.690598923), (-61, 12.309401077), align=None)
        Polygon((65, 14.618802154), (61, 12.309401077), (61, 7.690598923), (65, 5.381197846), (69, 7.690598923), (69, 12.309401077), align=None)
    extrude(amount=-CUT_EXTRUDE_12_DEPTH, mode=Mode.SUBTRACT)

    # 스케치15 → 컷-돌출13 (cut)
    with BuildSketch(Plane.XZ):
        with Locations((65, -13.618802154)):
            Circle(SKETCH_15_R)
        with Locations((61.866025404, -11.809401077)):
            Circle(SKETCH_15_R)
        with Locations((61.866025404, -8.190598923)):
            Circle(SKETCH_15_R)
        with Locations((65, -6.381197846)):
            Circle(SKETCH_15_R)
        with Locations((68.133974596, -8.190598923)):
            Circle(SKETCH_15_R)
        with Locations((68.133974596, -11.809401077)):
            Circle(SKETCH_15_R)
        with Locations((-68.133974596, -11.809401077)):
            Circle(SKETCH_15_R)
        with Locations((-68.133974596, -8.190598923)):
            Circle(SKETCH_15_R)
        with Locations((-65, -6.381197846)):
            Circle(SKETCH_15_R)
        with Locations((-61.866025404, -8.190598923)):
            Circle(SKETCH_15_R)
        with Locations((-61.866025404, -11.809401077)):
            Circle(SKETCH_15_R)
        with Locations((-65, -13.618802154)):
            Circle(SKETCH_15_R)
    extrude(amount=-CUT_EXTRUDE_13_DEPTH, mode=Mode.SUBTRACT)

    # 스케치16 → 컷-돌출14 (cut)
    with BuildSketch(Plane.XZ):
        with Locations((66.792893219, -47.907106781)):
            Circle(SKETCH_16_R)
        with Locations((66.792893219, -50.492893219)):
            Circle(SKETCH_16_R)
        with Locations((63.207106781, -50.492893219)):
            Circle(SKETCH_16_R)
        with Locations((63.207106781, -47.907106781)):
            Circle(SKETCH_16_R)
        with Locations((66.780891325, -22.919108675)):
            Circle(SKETCH_16_R_2)
        with Locations((63.219108675, -22.919108675)):
            Circle(SKETCH_16_R_2)
        with Locations((63.219108675, -26.480891325)):
            Circle(SKETCH_16_R_2)
        with Locations((66.780891325, -26.480891325)):
            Circle(SKETCH_16_R_2)
        with Locations((-66.780891325, -26.480891325)):
            Circle(SKETCH_16_R_2)
        with Locations((-63.219108675, -26.480891325)):
            Circle(SKETCH_16_R_2)
        with Locations((-63.219108675, -22.919108675)):
            Circle(SKETCH_16_R_2)
        with Locations((-66.780891325, -22.919108675)):
            Circle(SKETCH_16_R_2)
        with Locations((-63.207106781, -47.907106781)):
            Circle(SKETCH_16_R)
        with Locations((-63.207106781, -50.492893219)):
            Circle(SKETCH_16_R)
        with Locations((-66.792893219, -50.492893219)):
            Circle(SKETCH_16_R)
        with Locations((-66.792893219, -47.907106781)):
            Circle(SKETCH_16_R)
    extrude(amount=-CUT_EXTRUDE_14_DEPTH, mode=Mode.SUBTRACT)


solid = part.part
